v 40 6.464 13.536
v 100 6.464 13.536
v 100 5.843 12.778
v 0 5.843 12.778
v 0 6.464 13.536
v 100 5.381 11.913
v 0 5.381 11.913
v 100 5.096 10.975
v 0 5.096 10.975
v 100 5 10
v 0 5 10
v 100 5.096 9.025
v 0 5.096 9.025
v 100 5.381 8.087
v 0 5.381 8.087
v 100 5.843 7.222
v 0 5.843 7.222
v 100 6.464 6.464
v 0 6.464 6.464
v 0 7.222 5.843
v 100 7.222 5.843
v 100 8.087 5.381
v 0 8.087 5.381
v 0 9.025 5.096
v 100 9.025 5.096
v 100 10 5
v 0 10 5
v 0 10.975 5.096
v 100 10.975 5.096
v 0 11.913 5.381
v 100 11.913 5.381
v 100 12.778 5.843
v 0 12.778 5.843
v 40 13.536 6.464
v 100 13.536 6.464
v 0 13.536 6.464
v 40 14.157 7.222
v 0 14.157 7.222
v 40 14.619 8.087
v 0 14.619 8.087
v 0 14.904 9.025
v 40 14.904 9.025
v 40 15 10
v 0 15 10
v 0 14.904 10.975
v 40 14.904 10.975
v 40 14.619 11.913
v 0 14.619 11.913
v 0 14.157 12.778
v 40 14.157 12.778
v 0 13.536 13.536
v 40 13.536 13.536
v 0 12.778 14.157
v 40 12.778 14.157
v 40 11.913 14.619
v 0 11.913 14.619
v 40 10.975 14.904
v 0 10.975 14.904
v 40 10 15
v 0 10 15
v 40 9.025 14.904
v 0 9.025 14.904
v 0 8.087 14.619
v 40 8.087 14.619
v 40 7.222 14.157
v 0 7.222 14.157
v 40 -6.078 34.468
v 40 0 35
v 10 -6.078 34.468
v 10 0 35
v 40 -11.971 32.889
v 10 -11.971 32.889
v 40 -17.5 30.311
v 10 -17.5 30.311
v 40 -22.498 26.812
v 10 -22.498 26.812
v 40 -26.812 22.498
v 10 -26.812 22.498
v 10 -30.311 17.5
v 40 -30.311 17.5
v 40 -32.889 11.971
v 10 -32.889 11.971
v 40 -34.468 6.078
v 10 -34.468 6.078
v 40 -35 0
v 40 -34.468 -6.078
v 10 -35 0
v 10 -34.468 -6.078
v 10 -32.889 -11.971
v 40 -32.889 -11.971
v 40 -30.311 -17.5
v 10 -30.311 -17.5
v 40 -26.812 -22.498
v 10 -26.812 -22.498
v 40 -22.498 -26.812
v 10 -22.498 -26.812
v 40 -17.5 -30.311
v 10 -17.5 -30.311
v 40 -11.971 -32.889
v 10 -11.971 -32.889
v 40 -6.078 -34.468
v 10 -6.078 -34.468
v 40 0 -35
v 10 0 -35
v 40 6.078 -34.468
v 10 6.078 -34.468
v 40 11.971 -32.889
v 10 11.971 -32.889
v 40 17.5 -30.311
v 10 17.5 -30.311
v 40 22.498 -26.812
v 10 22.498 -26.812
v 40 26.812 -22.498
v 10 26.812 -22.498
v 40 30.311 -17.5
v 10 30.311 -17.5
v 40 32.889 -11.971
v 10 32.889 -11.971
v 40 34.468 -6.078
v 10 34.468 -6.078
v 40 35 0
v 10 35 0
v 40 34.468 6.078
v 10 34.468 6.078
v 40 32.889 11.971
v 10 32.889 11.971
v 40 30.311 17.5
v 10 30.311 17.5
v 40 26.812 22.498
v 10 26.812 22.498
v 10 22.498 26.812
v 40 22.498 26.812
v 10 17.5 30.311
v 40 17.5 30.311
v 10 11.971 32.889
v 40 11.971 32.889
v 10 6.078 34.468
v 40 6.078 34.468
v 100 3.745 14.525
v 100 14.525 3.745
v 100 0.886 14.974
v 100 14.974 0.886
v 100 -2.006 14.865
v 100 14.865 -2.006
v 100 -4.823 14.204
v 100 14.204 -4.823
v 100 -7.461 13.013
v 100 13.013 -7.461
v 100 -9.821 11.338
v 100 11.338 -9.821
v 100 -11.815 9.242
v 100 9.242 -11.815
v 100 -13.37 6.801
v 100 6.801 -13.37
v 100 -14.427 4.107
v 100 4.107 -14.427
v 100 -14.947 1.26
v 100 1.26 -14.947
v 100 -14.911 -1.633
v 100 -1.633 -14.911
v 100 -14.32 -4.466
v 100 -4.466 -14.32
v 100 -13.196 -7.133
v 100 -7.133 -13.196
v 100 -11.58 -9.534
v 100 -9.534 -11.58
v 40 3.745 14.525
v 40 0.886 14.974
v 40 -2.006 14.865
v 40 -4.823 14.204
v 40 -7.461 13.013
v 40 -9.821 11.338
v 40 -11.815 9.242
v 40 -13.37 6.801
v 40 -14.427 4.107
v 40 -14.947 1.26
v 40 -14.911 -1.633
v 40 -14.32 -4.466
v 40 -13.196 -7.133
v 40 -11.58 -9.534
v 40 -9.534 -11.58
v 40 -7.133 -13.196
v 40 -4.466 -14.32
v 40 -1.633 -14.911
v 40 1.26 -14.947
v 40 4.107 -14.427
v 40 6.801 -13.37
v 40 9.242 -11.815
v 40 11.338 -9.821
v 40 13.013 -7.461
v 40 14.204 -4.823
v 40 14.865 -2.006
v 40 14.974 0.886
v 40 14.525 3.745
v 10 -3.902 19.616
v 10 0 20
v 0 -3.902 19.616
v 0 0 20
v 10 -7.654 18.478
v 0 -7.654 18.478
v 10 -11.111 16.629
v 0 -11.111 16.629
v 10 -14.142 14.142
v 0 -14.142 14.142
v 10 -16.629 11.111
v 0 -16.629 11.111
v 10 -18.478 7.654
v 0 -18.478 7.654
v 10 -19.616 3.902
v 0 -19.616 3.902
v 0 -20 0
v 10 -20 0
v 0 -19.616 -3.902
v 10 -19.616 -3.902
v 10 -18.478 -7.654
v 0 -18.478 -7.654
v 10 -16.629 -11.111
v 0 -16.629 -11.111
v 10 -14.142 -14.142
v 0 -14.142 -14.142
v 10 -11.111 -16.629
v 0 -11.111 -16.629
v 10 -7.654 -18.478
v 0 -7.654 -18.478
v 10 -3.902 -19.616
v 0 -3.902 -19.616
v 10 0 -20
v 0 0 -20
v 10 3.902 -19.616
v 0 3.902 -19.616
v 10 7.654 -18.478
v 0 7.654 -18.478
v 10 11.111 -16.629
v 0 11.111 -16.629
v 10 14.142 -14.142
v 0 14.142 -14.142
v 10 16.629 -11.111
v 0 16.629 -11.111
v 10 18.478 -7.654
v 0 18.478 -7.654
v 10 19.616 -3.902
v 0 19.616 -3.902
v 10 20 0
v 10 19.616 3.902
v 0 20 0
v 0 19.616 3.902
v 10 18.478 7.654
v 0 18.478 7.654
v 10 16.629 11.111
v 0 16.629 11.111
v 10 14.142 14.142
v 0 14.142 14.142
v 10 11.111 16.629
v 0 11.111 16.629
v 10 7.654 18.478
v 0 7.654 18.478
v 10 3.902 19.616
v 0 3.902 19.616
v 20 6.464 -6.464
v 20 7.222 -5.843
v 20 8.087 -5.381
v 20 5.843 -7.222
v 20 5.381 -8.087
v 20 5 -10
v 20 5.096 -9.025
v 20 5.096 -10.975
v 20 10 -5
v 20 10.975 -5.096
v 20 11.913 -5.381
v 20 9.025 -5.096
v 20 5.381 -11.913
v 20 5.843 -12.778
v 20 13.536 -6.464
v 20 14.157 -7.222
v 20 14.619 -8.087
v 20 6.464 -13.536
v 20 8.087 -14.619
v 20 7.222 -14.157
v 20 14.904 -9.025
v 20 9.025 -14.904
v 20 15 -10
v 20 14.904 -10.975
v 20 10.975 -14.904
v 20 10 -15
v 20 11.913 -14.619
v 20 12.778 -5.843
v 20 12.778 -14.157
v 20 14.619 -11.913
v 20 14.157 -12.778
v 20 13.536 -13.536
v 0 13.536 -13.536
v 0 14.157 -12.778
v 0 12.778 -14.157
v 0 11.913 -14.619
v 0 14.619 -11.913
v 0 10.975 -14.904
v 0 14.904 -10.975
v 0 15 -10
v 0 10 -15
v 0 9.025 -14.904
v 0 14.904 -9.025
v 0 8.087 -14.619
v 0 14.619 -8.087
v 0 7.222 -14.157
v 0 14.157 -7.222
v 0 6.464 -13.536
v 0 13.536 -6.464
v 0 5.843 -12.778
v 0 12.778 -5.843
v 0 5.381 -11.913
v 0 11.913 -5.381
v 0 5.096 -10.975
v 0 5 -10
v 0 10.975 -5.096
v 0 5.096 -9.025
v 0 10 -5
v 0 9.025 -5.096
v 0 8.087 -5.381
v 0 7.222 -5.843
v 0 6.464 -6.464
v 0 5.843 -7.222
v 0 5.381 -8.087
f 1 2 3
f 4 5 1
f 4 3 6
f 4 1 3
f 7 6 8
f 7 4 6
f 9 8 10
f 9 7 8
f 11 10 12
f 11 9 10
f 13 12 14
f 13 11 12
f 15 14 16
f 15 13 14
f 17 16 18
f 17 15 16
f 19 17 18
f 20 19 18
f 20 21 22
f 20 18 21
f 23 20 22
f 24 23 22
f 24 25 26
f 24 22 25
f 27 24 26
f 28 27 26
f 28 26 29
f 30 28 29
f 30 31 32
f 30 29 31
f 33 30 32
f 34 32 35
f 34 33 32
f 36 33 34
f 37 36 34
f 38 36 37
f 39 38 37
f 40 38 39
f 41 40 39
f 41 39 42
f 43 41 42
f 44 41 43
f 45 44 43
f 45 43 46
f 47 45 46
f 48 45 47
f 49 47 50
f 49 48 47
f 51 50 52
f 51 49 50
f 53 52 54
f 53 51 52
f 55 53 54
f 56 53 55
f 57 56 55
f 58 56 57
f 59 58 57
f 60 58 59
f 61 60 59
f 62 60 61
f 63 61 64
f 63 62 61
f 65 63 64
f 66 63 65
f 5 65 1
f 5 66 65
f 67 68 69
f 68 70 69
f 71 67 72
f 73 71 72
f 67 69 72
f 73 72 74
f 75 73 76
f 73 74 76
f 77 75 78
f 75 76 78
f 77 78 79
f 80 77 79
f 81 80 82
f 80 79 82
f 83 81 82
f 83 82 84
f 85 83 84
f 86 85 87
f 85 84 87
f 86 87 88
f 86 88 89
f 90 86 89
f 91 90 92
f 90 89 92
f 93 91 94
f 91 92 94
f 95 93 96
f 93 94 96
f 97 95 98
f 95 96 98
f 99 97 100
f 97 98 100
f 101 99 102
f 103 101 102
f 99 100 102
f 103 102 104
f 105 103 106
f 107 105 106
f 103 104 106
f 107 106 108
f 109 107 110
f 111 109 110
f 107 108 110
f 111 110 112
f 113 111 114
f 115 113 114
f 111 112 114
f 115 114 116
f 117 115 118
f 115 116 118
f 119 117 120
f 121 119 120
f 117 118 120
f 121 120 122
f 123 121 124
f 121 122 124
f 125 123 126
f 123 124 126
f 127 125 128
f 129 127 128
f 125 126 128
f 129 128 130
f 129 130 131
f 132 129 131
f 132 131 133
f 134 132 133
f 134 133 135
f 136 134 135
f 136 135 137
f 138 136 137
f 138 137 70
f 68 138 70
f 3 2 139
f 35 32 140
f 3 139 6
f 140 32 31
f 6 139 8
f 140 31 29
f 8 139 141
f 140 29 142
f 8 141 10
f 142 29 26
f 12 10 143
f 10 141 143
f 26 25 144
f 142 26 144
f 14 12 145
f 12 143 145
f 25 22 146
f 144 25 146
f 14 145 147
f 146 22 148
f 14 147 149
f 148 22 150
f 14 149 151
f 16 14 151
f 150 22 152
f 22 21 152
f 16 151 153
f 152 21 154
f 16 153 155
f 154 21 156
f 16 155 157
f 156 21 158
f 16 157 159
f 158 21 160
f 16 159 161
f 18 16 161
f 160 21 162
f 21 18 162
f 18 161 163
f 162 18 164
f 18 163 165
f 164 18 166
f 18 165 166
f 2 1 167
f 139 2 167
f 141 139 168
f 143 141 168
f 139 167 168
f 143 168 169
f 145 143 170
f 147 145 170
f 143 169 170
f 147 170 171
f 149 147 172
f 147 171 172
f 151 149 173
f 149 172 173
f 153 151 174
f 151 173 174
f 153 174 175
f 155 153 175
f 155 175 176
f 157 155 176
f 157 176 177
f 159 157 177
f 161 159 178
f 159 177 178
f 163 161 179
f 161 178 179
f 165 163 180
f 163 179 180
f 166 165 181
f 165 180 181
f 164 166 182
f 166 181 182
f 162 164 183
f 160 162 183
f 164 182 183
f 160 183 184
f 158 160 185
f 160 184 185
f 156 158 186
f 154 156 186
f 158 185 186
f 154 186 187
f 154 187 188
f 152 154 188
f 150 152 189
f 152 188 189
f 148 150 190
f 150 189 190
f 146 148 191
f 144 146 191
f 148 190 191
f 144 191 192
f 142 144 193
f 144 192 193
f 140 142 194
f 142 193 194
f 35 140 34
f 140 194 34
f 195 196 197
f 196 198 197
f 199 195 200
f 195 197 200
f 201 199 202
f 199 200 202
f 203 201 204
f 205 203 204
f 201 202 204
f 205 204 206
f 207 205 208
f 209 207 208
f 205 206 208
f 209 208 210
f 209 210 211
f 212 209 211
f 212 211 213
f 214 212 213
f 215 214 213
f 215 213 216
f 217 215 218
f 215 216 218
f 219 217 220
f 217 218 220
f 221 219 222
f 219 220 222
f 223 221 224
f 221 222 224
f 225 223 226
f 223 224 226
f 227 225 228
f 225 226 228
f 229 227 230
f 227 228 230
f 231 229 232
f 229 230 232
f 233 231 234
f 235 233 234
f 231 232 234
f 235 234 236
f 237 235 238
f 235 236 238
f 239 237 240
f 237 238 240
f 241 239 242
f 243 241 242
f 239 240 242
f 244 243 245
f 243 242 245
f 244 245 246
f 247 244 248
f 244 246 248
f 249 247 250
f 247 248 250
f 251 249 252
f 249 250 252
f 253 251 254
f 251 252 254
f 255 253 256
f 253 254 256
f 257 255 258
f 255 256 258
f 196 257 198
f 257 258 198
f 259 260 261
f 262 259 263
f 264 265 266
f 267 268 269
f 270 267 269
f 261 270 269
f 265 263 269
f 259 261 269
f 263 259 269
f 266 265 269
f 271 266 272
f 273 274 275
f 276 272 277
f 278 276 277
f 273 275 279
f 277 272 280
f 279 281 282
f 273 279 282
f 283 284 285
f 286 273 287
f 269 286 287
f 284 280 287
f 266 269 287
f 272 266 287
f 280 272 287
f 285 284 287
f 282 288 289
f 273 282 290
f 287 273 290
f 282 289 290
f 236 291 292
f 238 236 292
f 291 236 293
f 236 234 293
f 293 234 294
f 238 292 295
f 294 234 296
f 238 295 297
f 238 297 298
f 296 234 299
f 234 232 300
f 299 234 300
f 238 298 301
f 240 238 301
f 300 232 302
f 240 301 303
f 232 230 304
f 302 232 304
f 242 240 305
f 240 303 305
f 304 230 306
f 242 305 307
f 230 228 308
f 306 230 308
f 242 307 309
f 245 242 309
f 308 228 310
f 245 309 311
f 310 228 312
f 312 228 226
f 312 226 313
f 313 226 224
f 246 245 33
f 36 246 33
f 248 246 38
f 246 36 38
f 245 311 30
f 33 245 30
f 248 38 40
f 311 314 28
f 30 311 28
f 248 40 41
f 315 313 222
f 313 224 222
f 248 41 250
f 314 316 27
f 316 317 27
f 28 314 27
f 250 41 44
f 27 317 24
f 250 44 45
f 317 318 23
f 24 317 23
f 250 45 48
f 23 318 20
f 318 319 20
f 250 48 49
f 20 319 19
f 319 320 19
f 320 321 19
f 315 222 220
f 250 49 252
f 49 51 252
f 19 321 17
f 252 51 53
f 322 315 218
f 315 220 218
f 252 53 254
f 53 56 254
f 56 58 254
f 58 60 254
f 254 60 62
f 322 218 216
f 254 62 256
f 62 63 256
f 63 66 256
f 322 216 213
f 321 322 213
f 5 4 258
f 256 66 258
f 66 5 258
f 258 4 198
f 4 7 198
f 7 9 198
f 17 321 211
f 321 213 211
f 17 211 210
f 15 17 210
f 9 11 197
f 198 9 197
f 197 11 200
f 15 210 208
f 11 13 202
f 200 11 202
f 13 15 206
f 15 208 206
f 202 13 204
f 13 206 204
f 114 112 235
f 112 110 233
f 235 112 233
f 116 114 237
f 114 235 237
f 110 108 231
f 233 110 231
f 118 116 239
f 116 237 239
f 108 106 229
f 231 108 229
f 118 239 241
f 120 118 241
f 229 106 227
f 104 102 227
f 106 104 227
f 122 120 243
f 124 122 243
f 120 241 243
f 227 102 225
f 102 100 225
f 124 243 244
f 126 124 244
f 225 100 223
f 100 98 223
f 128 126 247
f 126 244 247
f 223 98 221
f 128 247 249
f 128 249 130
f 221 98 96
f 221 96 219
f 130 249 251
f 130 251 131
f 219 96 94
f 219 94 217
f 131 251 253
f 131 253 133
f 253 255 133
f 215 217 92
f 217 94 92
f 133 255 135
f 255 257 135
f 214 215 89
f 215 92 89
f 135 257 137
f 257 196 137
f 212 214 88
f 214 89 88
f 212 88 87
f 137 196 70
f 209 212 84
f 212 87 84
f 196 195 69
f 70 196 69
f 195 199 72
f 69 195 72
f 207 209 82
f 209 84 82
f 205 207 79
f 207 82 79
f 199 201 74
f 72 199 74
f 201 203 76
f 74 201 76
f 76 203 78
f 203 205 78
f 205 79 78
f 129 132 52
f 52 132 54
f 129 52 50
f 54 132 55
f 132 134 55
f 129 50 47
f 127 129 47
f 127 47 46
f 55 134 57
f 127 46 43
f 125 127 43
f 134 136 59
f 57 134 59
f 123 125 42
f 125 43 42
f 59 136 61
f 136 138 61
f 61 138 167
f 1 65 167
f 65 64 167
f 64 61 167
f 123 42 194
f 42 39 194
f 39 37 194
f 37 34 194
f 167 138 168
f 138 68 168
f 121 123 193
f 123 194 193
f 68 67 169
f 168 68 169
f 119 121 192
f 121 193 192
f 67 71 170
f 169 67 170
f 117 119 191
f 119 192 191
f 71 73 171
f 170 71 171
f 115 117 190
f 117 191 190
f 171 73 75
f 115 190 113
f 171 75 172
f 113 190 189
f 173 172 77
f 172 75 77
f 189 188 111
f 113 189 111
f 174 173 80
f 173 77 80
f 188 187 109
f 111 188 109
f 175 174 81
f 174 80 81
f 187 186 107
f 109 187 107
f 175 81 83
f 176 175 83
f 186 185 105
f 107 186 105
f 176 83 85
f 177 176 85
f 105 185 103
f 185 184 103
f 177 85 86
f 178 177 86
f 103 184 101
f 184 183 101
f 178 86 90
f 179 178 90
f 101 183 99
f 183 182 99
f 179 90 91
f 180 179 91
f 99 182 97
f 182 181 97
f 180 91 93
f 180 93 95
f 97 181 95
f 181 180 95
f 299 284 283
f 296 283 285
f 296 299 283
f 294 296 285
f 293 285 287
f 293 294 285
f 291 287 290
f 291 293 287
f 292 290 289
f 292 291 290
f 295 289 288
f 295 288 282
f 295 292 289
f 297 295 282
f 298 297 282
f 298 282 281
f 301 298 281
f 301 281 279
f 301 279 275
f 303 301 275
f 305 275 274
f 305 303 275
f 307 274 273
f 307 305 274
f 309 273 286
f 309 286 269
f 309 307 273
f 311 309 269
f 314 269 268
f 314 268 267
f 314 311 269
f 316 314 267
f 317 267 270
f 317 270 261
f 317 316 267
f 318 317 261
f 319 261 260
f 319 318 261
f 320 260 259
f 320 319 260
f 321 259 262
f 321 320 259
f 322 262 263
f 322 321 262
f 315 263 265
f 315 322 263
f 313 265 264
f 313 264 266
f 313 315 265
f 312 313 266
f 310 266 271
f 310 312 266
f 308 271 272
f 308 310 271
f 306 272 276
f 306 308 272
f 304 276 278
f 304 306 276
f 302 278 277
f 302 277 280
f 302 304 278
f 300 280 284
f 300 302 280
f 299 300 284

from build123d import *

# Parameters (mm, degrees)
SKETCH_2_R          = 5
CUT_EXTRUDE_1_DEPTH = 20
SKETCH_3_R          = 5
CUT_EXTRUDE_2_DEPTH = 112.579568022


with BuildPart() as part:
    # Эскиз1 → Повернуть1 (revolve)
    with BuildSketch(Plane.XY, mode=Mode.PRIVATE) as revolve_1_sk:
        Polygon((0, 0), (100, 0), (100, 15), (40, 15), (40, 35), (10, 35), (10, 20), (0, 20), align=None)
    revolve(revolve_1_sk.sketch.rotate(Axis((0, 0, 0), (1, 0, 0)), 90), axis=Axis((0, 0, 0), (1, 0, 0)))

    # Эскиз2 → Вырез-Вытянуть1 (cut)
    with BuildSketch(Plane(origin=(0, 0, 0), x_dir=(0, 0, -1), z_dir=(1, 0, 0))):
        with Locations((10, 10)):
            Circle(SKETCH_2_R)
    extrude(amount=CUT_EXTRUDE_1_DEPTH, mode=Mode.SUBTRACT)

    # Эскиз3 → Вырез-Вытянуть2 (cut, through all)
    with BuildSketch(Plane(origin=(0, 0, 0), x_dir=(0, 0, -1), z_dir=(1, 0, 0))):
        with Locations(Location((-10, 10, 0), (0, 0, 225))):
            Circle(SKETCH_3_R)
    extrude(amount=CUT_EXTRUDE_2_DEPTH, mode=Mode.SUBTRACT)


solid = part.part
